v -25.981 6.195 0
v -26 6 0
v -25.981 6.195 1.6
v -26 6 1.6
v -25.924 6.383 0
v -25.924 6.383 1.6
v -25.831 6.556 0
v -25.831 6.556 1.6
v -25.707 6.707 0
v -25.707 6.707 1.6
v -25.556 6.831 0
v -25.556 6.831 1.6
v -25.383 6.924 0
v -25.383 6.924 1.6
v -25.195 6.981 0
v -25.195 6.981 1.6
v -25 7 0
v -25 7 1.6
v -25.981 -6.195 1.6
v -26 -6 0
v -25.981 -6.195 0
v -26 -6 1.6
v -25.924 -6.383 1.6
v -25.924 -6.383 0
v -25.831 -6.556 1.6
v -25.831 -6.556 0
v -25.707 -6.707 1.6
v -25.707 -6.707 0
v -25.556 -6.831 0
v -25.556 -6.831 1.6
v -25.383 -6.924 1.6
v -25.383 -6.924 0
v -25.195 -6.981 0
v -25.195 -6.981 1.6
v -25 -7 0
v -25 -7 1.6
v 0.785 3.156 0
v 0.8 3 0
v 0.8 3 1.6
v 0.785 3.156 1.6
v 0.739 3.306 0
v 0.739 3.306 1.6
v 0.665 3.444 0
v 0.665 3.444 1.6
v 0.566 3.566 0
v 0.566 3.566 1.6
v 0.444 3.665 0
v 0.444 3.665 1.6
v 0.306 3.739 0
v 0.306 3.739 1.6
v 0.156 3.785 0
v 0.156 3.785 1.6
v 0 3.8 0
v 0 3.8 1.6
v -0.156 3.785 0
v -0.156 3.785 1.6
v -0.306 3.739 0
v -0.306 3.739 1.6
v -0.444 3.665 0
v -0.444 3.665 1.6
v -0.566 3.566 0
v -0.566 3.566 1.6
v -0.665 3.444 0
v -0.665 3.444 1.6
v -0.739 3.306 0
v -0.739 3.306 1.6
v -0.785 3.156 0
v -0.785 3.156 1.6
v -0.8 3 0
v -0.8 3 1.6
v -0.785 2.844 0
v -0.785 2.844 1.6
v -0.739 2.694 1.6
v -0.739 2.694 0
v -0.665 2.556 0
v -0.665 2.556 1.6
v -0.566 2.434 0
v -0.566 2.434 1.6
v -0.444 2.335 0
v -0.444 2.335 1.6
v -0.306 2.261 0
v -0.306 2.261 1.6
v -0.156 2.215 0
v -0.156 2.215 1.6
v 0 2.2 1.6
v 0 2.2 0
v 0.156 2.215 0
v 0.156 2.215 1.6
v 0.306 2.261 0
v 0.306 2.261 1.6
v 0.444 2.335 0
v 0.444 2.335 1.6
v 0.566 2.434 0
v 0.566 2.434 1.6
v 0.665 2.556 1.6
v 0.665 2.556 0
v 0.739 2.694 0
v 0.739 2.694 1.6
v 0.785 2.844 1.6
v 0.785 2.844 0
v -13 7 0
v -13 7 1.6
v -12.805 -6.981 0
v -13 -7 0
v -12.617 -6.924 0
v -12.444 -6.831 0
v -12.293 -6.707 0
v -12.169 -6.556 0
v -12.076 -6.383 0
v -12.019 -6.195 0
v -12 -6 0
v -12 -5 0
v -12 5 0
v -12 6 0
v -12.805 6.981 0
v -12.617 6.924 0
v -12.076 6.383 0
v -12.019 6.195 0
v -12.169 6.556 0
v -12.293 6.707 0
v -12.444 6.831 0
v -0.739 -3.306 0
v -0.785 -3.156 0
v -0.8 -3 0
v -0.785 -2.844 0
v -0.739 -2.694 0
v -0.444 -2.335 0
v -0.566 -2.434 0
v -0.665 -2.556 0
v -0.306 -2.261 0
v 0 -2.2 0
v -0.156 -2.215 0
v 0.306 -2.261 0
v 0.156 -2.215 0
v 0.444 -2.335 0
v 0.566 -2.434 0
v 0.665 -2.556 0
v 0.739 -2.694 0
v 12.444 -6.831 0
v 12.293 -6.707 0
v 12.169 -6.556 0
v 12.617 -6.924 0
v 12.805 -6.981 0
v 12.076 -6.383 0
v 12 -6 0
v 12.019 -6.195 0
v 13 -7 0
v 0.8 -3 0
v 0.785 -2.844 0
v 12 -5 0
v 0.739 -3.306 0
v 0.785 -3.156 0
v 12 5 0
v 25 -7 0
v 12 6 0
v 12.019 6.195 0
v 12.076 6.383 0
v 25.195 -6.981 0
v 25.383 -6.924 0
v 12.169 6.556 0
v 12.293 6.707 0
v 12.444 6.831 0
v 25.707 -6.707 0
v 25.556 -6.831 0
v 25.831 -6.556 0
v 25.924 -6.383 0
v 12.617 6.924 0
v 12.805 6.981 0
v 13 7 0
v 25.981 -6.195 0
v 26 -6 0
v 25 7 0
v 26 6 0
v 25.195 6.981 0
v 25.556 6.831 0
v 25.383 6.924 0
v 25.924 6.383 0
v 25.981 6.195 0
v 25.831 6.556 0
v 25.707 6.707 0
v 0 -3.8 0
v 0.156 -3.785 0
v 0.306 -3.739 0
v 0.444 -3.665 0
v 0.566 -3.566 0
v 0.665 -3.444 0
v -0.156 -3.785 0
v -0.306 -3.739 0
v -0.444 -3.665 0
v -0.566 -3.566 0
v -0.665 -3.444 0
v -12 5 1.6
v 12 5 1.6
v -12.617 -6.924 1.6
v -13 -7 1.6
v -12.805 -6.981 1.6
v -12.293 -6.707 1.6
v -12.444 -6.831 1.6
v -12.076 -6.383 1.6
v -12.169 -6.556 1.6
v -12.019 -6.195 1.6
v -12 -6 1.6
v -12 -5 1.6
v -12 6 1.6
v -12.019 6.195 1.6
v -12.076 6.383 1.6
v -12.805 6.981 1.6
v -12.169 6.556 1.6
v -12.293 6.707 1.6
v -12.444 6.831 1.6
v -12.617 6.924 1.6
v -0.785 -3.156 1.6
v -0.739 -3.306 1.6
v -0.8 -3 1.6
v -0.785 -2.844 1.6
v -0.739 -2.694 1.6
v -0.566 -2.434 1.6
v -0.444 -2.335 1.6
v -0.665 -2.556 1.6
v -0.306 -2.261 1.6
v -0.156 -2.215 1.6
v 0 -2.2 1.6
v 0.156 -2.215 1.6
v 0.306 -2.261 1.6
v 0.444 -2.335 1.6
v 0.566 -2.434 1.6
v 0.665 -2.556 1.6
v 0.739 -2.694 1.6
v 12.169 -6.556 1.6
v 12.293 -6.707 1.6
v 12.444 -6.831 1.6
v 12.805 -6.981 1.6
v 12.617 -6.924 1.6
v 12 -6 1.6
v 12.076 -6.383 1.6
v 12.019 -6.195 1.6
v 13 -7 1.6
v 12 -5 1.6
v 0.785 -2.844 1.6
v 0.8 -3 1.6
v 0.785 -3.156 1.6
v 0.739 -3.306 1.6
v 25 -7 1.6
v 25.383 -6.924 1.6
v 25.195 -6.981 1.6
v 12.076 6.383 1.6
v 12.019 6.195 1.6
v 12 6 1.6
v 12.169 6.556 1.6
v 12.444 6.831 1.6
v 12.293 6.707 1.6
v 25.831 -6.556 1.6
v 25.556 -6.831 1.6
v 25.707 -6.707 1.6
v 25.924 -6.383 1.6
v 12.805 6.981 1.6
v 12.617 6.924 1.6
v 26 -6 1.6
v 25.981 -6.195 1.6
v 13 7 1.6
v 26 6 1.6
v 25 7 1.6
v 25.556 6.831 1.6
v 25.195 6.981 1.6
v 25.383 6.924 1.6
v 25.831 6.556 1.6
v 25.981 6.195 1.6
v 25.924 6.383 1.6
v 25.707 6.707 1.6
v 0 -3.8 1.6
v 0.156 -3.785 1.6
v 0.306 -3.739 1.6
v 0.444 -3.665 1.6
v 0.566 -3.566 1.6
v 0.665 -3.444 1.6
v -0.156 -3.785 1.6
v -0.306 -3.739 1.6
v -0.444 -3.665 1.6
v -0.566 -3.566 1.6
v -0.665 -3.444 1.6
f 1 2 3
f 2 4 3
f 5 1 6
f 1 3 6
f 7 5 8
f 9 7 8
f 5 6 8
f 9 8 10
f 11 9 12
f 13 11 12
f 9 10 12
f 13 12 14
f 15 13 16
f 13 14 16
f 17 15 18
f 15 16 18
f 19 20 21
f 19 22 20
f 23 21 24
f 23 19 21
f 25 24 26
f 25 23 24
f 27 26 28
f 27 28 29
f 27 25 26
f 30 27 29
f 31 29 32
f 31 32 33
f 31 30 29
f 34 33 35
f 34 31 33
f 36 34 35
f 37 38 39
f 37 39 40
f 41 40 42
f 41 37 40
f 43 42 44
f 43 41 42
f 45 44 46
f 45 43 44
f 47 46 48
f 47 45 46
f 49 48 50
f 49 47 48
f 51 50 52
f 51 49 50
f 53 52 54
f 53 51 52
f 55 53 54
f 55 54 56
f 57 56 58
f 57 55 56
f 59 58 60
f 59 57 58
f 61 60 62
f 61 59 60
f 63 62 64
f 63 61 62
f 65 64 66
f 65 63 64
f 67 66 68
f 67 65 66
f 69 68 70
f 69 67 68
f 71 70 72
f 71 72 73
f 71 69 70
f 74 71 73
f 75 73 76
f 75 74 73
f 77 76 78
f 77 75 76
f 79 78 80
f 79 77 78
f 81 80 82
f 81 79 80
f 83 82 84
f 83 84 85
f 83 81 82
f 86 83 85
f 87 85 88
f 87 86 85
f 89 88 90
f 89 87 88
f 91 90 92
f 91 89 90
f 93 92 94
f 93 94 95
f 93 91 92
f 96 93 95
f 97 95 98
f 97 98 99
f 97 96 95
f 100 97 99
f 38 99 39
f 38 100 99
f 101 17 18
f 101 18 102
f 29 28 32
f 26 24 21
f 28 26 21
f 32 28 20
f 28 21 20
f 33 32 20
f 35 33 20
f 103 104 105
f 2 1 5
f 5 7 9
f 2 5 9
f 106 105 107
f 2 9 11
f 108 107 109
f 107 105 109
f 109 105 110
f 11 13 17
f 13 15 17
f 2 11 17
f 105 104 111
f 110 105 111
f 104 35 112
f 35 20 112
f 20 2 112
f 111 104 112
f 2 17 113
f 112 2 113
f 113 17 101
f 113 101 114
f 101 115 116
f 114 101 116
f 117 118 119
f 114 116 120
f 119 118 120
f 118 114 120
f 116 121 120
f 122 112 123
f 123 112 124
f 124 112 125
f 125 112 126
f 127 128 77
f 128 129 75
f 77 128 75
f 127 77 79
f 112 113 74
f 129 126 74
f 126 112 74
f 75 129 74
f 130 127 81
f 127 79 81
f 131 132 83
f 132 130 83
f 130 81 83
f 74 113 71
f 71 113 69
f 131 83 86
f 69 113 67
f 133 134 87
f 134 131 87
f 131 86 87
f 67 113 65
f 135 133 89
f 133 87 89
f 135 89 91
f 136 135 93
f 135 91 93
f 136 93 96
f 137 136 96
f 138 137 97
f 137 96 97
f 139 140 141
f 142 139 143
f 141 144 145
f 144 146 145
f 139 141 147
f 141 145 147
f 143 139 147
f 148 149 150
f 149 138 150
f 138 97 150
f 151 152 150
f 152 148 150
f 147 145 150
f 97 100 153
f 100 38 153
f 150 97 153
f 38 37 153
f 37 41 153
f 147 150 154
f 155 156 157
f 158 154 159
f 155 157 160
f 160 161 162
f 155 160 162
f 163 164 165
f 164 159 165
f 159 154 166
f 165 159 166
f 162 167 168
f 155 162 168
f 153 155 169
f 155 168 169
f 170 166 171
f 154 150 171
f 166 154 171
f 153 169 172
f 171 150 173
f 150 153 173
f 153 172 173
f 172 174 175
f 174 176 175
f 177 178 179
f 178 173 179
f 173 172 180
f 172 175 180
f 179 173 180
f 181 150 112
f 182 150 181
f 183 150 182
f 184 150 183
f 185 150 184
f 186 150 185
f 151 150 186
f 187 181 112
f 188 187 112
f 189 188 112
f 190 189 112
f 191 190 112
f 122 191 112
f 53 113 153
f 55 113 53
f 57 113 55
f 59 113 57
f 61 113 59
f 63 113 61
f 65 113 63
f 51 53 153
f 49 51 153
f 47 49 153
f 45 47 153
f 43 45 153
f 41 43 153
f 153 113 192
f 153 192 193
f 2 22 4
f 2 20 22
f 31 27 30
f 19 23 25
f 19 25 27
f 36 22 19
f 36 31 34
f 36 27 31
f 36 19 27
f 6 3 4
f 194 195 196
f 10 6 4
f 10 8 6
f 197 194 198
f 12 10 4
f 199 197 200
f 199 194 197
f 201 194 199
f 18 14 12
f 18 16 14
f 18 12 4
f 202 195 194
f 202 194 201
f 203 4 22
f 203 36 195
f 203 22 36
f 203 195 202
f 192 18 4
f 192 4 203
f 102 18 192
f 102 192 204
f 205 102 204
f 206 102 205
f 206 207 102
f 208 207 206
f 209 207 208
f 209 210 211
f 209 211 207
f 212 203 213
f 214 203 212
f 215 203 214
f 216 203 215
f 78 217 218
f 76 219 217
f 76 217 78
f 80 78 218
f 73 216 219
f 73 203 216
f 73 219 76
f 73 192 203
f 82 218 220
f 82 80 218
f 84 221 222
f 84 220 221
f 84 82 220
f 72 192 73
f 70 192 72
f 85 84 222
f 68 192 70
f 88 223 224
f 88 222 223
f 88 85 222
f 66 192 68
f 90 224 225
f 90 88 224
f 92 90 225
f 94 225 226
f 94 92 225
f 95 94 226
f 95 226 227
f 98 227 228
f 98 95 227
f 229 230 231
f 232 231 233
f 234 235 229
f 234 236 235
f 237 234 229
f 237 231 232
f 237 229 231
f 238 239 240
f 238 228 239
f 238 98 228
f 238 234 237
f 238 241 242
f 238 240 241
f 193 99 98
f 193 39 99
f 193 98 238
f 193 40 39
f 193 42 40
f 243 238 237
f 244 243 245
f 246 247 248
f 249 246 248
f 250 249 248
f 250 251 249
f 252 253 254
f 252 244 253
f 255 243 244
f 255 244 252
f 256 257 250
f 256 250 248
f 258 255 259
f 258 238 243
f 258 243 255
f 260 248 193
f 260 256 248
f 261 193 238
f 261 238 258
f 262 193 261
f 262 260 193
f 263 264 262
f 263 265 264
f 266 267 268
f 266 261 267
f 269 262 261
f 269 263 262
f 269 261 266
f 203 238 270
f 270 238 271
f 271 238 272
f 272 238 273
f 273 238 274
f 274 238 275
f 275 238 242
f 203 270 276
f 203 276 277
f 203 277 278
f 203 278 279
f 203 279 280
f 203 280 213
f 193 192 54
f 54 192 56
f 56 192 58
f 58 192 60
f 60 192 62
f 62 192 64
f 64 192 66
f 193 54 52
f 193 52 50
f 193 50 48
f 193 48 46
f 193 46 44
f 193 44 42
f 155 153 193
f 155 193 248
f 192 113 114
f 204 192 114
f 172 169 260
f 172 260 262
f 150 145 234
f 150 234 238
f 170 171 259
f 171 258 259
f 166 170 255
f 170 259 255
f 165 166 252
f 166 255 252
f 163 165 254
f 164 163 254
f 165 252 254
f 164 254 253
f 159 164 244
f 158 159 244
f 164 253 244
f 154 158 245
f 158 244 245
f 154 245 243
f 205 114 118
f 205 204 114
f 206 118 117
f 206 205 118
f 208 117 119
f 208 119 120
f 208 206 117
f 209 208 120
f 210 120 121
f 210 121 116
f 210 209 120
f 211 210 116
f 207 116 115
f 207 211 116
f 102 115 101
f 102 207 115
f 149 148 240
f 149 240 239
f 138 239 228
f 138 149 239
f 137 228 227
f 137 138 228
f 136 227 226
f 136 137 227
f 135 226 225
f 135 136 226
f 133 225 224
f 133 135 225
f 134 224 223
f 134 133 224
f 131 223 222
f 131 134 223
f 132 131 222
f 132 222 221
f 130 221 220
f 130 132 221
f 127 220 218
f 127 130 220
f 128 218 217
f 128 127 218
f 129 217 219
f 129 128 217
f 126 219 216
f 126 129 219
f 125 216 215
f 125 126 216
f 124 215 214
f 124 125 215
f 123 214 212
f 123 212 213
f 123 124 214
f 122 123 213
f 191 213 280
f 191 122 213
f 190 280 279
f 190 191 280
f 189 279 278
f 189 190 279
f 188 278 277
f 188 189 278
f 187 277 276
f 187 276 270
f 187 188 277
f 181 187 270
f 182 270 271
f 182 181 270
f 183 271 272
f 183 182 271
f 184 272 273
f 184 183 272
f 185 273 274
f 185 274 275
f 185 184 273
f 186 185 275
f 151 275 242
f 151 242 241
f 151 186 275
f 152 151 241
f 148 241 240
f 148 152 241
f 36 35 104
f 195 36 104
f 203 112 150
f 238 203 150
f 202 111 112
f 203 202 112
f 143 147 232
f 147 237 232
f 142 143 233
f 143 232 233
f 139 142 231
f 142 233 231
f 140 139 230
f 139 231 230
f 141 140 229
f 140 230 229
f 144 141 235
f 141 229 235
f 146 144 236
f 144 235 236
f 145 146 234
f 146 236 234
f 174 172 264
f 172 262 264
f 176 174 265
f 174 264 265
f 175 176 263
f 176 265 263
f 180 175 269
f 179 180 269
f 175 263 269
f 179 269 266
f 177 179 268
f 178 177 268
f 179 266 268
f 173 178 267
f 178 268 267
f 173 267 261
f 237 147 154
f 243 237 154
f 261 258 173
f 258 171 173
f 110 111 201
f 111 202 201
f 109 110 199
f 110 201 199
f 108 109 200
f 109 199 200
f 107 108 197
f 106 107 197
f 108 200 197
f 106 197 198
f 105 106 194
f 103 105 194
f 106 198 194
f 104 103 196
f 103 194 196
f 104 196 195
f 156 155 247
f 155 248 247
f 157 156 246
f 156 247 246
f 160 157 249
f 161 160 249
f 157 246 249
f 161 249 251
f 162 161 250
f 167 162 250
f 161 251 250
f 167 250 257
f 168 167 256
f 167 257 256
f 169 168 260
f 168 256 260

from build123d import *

# Parameters (mm, degrees)
SKETCH_1_W          = 52
SKETCH_1_H          = 10
EXTRUDE_1_DEPTH     = 1.6
SKETCH_2_R          = 0.8
CUT_EXTRUDE_1_DEPTH = 1.6
SKETCH_3_W          = 14
SKETCH_3_H          = 14
EXTRUDE_3_DEPTH     = 1.6
FILLET_1_R          = 1


with BuildPart() as part:
    # 草图1 → 凸台-拉伸1 (new body)
    with BuildSketch(Plane.XY):
        Rectangle(SKETCH_1_W, SKETCH_1_H)
    extrude(amount=EXTRUDE_1_DEPTH)

    # 草图2 → 切除-拉伸1 (cut)
    with BuildSketch(Plane.XY):
        with Locations((0, 3)):
            Circle(SKETCH_2_R)
        with Locations((0, -3)):
            Circle(SKETCH_2_R)
    extrude(amount=CUT_EXTRUDE_1_DEPTH, mode=Mode.SUBTRACT)

    # 草图3 → 凸台-拉伸3 (add)
    with BuildSketch(Plane.XY):
        with Locations((-19, 0)):
            Rectangle(SKETCH_3_W, SKETCH_3_H)
        with Locations((19, 0)):
            Rectangle(SKETCH_3_W, SKETCH_3_H)
    extrude(amount=EXTRUDE_3_DEPTH)

    # 圆角1
    fillet_1_edges = [part.edges().sort_by_distance(p)[0] for p in [
        (-12, -7, 0.8),
        (-26, 7, 0.8),
        (-26, -7, 0.8),
        (-12, 7, 0.8),
        (12, 7, 0.8),
        (12, -7, 0.8),
        (26, -7, 0.8),
        (26, 7, 0.8),
    ]]
    fillet(fillet_1_edges, radius=FILLET_1_R)


solid = part.part
